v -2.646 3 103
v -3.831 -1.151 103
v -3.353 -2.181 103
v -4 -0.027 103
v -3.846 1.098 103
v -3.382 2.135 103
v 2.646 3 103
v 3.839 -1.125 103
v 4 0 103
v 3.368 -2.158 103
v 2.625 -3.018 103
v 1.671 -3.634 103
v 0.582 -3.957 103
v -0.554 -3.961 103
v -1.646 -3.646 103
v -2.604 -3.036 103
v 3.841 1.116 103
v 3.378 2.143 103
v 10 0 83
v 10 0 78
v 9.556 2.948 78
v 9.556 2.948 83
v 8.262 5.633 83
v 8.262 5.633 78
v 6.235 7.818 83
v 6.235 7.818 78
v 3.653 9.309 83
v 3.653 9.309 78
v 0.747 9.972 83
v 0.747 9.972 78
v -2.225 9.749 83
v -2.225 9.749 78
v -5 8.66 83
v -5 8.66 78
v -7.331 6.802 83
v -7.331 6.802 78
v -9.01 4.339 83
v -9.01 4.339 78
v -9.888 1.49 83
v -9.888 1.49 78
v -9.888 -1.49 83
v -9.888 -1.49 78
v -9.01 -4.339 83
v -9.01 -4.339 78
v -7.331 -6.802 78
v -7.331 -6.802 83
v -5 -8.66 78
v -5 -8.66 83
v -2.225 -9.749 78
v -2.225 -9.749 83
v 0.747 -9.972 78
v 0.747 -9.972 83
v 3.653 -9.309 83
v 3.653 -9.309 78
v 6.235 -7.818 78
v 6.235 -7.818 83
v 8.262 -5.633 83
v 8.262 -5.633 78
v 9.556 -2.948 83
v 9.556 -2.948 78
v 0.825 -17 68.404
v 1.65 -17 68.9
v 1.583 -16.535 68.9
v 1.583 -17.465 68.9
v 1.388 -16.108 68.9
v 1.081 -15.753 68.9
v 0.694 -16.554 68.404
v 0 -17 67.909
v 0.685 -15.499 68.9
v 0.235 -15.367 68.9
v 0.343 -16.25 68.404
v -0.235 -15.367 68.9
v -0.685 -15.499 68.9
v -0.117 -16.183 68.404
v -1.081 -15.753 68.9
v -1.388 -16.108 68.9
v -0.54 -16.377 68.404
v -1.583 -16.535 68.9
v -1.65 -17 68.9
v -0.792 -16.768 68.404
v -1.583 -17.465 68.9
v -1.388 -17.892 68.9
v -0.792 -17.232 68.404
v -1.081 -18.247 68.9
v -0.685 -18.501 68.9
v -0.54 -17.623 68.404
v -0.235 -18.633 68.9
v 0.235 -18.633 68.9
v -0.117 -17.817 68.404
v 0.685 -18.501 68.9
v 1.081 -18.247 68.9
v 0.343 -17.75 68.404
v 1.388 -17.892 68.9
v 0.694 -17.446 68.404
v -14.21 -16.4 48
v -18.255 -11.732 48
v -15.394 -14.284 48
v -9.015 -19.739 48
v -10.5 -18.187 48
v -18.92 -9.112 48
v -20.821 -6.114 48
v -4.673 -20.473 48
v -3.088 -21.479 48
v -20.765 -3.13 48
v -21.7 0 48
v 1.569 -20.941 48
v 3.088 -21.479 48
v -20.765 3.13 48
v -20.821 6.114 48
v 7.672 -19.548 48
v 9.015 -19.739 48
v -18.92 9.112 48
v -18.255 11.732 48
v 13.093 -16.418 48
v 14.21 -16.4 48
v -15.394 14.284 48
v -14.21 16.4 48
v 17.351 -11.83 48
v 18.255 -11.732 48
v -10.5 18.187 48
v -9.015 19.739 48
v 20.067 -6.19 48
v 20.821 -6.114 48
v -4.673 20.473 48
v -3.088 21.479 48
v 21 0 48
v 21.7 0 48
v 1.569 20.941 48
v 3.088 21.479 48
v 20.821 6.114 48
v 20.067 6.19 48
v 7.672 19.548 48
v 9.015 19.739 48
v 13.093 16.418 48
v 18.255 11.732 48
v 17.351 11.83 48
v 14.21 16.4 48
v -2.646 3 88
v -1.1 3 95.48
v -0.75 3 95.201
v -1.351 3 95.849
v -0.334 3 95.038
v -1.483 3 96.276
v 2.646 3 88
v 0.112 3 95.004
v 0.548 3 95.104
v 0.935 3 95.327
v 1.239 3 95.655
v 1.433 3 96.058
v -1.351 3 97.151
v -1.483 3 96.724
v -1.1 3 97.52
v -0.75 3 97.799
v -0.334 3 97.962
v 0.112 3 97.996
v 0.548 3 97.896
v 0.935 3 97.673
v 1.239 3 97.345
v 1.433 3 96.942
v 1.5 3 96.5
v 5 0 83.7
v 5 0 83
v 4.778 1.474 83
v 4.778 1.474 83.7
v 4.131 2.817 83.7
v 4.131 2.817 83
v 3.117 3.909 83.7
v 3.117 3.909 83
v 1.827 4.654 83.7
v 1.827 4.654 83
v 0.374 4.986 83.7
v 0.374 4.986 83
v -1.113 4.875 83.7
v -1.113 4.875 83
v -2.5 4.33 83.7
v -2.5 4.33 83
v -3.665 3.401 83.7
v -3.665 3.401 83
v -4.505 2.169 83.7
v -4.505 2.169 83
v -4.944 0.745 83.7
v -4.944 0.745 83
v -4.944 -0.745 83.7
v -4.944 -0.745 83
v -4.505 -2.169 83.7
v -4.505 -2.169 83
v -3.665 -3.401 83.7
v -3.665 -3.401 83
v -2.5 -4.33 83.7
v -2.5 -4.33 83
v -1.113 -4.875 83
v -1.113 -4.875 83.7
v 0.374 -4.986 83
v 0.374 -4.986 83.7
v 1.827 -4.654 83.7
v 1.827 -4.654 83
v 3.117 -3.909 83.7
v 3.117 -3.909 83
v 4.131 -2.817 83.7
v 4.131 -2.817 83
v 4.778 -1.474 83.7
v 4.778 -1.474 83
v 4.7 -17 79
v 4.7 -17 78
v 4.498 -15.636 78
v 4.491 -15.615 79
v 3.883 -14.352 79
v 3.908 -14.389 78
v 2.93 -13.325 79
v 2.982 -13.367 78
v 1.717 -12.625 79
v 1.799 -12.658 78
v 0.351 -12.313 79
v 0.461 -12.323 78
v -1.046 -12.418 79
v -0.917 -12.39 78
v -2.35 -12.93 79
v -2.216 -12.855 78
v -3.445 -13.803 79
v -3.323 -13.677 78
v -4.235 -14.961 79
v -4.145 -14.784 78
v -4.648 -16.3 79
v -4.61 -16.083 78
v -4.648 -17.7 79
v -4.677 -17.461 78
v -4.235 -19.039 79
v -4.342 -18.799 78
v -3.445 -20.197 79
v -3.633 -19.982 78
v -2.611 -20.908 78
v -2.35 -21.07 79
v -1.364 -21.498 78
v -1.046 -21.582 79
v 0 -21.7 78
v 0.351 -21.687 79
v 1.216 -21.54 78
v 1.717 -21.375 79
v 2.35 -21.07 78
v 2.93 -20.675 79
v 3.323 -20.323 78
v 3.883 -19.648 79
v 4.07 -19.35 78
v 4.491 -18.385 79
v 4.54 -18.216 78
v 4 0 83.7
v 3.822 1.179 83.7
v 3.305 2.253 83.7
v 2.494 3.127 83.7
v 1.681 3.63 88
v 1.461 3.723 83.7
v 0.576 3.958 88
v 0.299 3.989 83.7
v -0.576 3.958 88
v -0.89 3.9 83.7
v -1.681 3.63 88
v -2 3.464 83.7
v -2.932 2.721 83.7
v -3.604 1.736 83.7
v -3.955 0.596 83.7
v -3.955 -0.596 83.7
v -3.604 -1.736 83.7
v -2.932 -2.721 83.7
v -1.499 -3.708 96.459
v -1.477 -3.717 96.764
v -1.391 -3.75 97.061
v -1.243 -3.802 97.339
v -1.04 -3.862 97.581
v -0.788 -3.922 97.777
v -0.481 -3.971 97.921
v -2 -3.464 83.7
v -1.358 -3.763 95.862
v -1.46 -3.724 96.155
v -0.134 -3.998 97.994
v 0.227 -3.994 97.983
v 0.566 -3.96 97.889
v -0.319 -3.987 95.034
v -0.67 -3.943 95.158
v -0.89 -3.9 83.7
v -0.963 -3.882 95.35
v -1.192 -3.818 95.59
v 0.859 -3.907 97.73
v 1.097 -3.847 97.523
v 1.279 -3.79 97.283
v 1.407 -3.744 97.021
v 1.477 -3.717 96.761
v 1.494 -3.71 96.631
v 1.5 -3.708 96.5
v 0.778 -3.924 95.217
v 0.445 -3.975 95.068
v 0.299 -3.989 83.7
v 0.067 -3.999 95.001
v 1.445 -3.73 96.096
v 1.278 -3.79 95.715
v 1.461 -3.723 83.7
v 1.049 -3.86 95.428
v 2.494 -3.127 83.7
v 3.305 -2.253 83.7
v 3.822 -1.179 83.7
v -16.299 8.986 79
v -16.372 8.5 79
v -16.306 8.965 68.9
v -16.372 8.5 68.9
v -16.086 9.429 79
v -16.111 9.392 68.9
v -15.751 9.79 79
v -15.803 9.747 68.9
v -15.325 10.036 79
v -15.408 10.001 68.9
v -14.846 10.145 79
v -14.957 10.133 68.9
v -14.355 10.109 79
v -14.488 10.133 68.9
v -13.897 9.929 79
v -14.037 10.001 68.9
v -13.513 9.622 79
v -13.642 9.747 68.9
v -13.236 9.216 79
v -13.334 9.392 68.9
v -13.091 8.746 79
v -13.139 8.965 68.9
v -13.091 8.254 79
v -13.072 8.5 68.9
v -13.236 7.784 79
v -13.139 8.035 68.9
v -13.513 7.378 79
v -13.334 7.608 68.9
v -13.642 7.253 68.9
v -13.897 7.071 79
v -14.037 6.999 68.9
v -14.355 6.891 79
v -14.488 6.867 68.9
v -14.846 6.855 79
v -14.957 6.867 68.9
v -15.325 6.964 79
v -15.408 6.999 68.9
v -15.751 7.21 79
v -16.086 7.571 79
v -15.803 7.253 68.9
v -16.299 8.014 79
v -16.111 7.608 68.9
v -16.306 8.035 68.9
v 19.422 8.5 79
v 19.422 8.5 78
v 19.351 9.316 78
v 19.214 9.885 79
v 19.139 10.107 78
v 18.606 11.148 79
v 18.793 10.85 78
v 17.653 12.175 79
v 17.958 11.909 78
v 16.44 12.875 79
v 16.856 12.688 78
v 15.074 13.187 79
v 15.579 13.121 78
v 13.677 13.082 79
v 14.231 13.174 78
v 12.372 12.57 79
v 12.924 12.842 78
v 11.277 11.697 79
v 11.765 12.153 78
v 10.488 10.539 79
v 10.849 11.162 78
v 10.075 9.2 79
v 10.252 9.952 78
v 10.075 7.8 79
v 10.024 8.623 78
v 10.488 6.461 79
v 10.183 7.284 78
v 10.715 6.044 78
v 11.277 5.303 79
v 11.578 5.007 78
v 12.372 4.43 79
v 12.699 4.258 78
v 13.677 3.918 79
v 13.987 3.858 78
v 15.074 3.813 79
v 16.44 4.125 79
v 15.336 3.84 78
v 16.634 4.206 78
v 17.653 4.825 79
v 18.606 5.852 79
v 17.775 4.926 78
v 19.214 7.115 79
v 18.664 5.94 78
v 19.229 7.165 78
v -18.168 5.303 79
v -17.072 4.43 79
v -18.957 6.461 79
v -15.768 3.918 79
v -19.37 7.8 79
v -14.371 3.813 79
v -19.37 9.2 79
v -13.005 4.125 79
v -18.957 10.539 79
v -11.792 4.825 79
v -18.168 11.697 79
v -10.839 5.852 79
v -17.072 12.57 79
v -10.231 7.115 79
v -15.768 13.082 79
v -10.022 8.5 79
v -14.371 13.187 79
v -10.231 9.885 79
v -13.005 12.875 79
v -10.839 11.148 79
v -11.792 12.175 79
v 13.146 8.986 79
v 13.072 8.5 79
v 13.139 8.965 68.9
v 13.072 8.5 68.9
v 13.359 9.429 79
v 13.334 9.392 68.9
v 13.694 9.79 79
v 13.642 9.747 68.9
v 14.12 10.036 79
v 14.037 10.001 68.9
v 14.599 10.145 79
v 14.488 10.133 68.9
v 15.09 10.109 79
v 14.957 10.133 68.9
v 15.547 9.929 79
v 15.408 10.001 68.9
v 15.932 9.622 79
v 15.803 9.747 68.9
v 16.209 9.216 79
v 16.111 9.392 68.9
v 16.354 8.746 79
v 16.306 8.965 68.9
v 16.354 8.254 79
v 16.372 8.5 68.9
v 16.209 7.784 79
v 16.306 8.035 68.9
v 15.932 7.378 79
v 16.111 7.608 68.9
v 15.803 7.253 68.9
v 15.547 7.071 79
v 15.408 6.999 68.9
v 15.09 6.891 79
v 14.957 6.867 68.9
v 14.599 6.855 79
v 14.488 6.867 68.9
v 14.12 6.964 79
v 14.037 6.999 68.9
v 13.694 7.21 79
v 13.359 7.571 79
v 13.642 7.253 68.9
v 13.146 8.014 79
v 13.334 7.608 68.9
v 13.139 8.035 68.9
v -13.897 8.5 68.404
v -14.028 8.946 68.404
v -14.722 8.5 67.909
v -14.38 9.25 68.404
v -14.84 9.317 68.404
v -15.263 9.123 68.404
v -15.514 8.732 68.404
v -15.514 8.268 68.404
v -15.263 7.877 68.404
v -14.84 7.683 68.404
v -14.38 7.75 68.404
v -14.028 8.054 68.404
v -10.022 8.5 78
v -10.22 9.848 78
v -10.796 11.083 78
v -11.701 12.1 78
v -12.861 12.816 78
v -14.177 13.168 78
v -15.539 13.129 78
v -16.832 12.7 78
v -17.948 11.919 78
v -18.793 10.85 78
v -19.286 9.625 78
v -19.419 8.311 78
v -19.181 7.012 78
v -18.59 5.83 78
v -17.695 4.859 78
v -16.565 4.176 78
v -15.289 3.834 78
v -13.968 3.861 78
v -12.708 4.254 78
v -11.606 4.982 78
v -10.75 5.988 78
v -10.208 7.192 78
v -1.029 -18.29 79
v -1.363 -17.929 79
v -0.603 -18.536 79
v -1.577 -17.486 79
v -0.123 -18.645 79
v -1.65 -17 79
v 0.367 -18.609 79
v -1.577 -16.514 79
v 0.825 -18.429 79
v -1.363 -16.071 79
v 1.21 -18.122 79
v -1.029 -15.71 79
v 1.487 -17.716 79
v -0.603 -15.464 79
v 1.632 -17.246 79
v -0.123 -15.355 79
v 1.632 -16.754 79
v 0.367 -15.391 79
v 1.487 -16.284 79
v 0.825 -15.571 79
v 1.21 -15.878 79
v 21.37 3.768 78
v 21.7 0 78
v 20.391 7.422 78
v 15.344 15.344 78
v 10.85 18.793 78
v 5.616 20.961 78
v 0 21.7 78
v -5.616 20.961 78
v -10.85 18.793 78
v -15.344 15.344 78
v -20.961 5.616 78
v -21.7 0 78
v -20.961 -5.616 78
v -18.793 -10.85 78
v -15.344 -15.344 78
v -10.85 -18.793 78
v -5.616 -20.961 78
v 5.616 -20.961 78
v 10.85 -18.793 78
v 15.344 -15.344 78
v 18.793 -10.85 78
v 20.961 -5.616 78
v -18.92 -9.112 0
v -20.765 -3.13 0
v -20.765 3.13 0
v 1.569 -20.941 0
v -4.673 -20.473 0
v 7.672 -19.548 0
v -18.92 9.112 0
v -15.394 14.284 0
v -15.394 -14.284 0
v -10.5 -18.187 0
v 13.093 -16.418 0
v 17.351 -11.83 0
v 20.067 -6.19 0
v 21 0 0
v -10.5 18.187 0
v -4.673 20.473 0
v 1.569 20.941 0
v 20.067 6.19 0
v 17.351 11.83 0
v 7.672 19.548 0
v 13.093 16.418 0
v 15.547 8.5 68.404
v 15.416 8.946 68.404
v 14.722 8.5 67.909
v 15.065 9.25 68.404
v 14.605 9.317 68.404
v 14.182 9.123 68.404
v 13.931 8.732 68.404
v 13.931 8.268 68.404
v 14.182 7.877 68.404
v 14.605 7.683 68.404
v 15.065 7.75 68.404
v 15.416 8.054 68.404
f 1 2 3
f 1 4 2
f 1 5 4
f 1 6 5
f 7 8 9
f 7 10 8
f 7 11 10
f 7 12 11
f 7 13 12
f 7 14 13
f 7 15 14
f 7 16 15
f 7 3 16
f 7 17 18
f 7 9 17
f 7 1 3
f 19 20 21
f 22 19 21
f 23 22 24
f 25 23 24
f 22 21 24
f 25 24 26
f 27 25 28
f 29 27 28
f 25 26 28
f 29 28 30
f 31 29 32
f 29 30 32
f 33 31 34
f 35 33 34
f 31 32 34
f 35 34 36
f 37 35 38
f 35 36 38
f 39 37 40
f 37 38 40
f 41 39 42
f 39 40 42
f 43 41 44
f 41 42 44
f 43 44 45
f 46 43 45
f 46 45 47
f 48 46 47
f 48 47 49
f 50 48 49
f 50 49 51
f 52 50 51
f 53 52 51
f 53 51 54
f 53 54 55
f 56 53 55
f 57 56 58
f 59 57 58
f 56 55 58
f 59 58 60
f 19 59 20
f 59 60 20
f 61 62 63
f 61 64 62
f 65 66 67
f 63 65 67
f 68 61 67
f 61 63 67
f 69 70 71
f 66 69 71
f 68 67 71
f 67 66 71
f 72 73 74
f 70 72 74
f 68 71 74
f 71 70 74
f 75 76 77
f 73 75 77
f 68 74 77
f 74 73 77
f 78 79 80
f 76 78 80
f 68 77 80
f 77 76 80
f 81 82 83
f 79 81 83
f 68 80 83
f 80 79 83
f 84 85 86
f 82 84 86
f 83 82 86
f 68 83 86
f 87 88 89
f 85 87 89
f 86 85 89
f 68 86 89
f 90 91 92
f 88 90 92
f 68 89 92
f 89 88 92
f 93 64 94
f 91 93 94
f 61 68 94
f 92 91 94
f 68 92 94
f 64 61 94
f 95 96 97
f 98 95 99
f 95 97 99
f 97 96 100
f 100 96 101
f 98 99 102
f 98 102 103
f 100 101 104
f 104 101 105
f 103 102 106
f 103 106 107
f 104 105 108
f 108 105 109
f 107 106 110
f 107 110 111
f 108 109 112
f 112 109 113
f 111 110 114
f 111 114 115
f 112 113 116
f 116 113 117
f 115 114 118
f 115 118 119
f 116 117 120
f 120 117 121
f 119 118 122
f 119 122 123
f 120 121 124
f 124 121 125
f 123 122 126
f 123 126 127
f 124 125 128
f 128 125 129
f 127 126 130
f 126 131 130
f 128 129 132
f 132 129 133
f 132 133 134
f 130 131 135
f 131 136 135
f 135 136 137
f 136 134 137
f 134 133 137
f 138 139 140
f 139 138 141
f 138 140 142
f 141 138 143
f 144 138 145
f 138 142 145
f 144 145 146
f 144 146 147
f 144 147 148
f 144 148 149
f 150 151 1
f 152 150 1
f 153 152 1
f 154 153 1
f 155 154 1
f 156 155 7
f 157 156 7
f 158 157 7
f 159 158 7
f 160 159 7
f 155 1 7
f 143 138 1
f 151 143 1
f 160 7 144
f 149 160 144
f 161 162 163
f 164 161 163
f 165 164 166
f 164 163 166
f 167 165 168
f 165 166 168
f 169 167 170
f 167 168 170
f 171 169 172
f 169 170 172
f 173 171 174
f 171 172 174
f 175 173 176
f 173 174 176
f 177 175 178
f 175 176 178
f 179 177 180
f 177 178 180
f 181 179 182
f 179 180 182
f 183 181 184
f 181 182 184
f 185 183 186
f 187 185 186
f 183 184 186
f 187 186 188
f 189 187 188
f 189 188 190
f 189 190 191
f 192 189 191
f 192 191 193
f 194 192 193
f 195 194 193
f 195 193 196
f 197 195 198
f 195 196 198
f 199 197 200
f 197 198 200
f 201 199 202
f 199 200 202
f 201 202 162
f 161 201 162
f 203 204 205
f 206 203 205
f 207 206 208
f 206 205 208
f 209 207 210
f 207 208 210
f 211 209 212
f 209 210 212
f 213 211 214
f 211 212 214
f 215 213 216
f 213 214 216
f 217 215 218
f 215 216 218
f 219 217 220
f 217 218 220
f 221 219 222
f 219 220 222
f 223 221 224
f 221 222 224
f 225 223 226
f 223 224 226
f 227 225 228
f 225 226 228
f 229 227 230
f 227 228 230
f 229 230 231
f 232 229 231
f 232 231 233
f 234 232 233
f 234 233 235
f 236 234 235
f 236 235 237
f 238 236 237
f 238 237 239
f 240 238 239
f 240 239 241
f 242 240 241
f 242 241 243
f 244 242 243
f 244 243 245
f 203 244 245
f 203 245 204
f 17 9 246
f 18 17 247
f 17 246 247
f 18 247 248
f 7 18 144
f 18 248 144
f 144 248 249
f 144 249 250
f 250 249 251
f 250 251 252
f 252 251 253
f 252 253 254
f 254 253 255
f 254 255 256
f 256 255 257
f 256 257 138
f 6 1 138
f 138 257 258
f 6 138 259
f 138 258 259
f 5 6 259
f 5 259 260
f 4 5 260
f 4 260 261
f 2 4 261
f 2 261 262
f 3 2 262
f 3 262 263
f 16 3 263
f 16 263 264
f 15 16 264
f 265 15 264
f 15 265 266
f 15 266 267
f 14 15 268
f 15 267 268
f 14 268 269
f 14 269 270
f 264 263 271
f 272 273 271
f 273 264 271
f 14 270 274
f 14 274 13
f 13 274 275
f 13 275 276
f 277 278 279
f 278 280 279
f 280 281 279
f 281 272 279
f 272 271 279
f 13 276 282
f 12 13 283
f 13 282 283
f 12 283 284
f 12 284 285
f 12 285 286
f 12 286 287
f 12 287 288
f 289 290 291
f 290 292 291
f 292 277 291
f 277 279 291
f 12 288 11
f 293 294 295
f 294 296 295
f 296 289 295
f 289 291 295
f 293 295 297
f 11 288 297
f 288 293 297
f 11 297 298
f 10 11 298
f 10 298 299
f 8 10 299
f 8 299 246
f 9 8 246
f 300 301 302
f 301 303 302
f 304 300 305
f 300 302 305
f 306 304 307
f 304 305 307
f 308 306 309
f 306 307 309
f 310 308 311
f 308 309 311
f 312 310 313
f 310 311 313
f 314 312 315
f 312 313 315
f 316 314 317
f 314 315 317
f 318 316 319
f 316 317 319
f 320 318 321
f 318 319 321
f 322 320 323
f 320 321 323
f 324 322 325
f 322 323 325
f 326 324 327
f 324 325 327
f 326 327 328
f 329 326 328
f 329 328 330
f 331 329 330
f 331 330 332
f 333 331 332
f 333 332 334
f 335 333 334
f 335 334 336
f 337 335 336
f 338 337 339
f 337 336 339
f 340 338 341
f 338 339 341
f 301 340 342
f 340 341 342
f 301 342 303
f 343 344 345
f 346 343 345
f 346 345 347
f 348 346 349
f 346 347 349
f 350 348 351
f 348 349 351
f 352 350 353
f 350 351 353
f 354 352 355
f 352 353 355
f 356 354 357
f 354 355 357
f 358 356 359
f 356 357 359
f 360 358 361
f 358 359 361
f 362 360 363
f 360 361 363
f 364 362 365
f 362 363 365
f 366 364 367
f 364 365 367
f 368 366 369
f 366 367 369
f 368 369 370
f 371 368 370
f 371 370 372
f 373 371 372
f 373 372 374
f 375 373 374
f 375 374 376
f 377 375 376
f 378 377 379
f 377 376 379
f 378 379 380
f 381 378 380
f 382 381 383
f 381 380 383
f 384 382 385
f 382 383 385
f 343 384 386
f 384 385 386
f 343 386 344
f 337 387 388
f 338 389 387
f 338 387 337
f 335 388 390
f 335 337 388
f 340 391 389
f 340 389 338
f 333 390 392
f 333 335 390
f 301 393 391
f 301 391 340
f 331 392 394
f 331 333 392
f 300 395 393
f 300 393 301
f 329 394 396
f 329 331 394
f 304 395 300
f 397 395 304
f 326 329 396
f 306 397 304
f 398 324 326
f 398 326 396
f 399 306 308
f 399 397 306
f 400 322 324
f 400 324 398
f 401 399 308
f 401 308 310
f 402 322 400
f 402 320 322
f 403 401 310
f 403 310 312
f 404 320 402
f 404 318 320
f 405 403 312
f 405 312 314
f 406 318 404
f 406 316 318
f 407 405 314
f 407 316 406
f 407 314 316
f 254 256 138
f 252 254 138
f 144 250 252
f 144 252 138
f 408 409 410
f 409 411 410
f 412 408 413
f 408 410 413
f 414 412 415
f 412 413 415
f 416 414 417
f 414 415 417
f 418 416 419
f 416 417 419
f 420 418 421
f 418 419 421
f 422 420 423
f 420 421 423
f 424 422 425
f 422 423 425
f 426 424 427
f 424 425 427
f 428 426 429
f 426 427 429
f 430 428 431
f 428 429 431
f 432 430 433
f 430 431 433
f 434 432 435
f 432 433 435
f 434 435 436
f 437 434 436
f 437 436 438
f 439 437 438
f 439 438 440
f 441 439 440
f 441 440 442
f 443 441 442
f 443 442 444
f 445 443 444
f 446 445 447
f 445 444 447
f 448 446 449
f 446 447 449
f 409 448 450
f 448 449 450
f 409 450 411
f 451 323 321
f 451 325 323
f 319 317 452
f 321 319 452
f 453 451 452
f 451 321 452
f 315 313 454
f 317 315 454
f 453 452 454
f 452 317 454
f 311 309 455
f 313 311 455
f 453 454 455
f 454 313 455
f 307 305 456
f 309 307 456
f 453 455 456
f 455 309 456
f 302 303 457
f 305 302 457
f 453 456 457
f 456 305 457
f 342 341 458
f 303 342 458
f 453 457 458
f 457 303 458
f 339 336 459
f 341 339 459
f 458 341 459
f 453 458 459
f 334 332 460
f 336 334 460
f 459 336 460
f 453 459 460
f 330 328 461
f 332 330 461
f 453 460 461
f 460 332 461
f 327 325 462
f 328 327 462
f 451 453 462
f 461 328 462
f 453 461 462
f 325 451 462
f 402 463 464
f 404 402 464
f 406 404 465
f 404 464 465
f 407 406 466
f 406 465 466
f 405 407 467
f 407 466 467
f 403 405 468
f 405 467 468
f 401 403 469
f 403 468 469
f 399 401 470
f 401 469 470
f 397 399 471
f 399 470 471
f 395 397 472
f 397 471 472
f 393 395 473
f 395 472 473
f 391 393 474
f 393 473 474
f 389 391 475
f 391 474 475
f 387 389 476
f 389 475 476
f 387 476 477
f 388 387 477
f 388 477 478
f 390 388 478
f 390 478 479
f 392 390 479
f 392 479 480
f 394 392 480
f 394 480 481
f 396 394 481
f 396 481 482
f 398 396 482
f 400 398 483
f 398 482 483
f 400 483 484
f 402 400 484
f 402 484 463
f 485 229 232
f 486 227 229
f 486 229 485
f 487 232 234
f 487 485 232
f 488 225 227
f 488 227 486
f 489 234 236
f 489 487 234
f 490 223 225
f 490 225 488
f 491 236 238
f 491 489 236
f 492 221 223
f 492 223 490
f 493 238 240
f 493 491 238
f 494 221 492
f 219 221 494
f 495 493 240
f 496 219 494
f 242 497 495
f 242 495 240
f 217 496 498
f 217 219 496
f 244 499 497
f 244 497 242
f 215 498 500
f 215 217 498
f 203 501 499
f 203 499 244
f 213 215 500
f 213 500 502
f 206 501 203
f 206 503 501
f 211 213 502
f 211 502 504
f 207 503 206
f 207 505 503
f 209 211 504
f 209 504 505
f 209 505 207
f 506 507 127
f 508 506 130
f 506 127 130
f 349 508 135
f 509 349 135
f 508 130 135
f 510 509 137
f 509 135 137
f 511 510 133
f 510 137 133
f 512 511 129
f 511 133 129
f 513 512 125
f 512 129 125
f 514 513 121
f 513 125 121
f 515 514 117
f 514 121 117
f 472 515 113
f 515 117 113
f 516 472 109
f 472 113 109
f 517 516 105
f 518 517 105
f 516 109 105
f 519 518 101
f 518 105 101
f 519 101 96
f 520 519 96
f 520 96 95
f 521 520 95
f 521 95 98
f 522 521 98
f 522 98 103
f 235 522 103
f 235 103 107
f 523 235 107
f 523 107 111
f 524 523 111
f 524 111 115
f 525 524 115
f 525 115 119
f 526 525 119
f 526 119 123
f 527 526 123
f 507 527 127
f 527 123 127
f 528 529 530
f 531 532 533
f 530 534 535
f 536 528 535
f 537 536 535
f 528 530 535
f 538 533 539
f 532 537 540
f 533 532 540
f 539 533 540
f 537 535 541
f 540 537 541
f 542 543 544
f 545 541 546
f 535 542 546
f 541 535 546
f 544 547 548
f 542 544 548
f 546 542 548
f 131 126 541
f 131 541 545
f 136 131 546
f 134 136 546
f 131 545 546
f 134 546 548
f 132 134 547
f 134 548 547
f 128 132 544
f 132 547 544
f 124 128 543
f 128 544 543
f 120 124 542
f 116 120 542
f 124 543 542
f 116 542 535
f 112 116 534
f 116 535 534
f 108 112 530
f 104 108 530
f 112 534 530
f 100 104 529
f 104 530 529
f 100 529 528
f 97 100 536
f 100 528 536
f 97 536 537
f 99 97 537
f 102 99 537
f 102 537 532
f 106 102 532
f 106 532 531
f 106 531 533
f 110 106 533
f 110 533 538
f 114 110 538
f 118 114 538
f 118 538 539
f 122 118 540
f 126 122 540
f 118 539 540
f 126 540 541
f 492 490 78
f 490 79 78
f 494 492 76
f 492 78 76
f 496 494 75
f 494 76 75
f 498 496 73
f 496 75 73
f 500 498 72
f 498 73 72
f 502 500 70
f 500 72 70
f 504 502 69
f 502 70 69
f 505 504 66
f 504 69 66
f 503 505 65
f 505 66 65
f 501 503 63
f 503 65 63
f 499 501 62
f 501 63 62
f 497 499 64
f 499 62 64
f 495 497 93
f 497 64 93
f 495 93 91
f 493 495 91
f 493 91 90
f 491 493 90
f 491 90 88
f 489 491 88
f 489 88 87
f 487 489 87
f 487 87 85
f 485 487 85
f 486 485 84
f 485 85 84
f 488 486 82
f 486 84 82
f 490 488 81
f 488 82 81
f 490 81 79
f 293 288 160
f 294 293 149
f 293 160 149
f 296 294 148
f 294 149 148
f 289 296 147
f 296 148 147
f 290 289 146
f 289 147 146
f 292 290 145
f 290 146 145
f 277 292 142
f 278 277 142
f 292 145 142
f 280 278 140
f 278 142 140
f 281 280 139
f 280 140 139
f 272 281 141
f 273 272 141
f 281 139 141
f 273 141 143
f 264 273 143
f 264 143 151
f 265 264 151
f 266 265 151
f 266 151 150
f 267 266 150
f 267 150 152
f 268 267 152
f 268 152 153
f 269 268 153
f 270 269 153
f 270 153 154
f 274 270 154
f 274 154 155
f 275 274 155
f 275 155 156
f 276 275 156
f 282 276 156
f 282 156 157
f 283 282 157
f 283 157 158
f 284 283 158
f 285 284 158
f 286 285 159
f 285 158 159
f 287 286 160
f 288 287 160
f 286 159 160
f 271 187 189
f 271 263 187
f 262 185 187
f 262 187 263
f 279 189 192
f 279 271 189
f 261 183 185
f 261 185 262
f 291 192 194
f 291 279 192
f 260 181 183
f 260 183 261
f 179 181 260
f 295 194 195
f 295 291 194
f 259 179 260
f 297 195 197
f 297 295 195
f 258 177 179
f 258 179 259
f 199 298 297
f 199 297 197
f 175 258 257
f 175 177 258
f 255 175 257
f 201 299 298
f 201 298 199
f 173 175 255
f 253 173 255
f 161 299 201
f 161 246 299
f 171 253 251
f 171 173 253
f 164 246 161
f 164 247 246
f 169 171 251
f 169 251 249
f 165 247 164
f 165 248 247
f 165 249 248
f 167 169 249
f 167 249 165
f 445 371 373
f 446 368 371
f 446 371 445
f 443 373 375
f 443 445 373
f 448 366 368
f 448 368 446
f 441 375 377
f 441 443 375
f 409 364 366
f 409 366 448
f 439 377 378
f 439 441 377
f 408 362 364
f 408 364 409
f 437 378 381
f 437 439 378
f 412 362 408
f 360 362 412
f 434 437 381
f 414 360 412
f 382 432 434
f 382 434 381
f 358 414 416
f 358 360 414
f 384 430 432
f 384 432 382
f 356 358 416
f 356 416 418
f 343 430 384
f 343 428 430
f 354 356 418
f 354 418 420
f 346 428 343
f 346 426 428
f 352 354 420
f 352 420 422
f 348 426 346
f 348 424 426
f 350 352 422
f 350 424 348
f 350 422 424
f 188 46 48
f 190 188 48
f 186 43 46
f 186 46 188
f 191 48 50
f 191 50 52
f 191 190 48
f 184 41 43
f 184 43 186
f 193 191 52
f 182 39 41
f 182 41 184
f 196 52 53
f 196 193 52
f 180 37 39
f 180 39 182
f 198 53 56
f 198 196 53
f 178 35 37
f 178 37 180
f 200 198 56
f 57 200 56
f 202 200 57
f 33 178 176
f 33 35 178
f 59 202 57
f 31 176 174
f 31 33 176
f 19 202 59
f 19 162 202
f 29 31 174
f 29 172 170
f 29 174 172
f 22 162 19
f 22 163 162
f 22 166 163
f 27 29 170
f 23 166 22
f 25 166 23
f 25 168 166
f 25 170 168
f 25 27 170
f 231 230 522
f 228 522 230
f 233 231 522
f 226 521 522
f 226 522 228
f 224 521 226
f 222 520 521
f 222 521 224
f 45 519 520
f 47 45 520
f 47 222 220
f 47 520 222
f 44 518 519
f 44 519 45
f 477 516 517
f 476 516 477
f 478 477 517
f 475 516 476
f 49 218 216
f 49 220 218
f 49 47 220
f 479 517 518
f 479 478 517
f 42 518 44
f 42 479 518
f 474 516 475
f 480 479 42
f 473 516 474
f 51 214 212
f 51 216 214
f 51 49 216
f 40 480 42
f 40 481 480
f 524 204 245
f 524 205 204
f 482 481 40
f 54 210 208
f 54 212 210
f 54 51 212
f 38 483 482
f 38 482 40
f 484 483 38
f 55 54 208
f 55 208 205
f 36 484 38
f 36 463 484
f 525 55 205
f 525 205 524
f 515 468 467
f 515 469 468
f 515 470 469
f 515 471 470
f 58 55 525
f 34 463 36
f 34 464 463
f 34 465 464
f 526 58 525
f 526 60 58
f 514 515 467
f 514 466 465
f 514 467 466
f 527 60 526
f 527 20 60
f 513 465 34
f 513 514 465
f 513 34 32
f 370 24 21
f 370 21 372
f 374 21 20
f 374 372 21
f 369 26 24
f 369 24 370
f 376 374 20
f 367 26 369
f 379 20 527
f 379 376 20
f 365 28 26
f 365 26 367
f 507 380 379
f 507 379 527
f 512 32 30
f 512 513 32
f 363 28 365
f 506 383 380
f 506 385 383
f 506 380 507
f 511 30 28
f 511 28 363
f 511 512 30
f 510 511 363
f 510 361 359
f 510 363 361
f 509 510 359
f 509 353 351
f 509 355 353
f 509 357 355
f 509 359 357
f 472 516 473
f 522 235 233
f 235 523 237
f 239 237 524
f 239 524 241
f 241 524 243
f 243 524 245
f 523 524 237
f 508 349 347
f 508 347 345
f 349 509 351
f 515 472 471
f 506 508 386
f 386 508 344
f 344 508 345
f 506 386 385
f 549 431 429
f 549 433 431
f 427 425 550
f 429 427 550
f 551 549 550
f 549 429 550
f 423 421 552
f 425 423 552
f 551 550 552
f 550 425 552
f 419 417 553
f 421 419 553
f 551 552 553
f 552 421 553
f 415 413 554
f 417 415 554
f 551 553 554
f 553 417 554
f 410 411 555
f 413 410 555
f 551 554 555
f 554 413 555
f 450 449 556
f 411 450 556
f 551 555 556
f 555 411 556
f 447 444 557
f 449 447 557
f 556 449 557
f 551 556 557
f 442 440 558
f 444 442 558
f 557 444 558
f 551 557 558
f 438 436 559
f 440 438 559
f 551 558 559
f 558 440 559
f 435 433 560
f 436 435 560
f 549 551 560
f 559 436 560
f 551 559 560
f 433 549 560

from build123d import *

# Parameters (mm, degrees)
SKETCH1_R                 = 21
BOSS_EXTRUDE1_DEPTH       = 48
SKETCH2_R                 = 21.7
BOSS_EXTRUDE2_DEPTH       = 30
SKETCH3_R                 = 4.7
BOSS_EXTRUDE3_DEPTH       = 1
SKETCH3_3_R               = 10
BOSS_EXTRUDE4_DEPTH       = 5
SKETCH4_R                 = 4
BOSS_EXTRUDE5_DEPTH       = 20
CUT_EXTRUDE1_DEPTH        = 1
CUT_EXTRUDE1_DEPTH_BACK   = 15
SKETCH6_R                 = 1.5
CUT_EXTRUDE2_DEPTH        = 15
M4X0_7_TAPPED_HOLE2_D     = 3.3
M4X0_7_TAPPED_HOLE2_DEPTH = 10.1
M4X0_7_TAPPED_HOLE2_TIP   = 0.991420021
SKETCH9_R                 = 5
SKETCH9_R_2               = 4
BOSS_EXTRUDE6_DEPTH       = 0.7


with BuildPart() as part:
    # Sketch1 → Boss-Extrude1 (new body)
    with BuildSketch(Plane.XY):
        Circle(SKETCH1_R)
    extrude(amount=BOSS_EXTRUDE1_DEPTH)

    # Sketch2 → Boss-Extrude2 (add)
    with BuildSketch(Plane.XY.offset(48)):
        Circle(SKETCH2_R)
    extrude(amount=BOSS_EXTRUDE2_DEPTH)

    # Sketch3 → Boss-Extrude3 (add)
    with BuildSketch(Plane.XY.offset(78)):
        with Locations((-14.722431864, 8.5)):
            Circle(SKETCH3_R)
        with Locations((14.722431864, 8.5)):
            Circle(SKETCH3_R)
        with Locations((0, -17)):
            Circle(SKETCH3_R)
    extrude(amount=BOSS_EXTRUDE3_DEPTH)

    # Sketch3<3> → Boss-Extrude4 (add)
    with BuildSketch(Plane.XY.offset(78)):
        Circle(SKETCH3_3_R)
    extrude(amount=BOSS_EXTRUDE4_DEPTH)

    # Sketch4 → Boss-Extrude5 (add)
    with BuildSketch(Plane.XY.offset(83)):
        Circle(SKETCH4_R)
    extrude(amount=BOSS_EXTRUDE5_DEPTH)

    # Sketch5 → Cut-Extrude1 (cut, two sides)
    with BuildSketch(Plane.XY.offset(103)) as cut_extrude1_sk:
        Polygon((-82.008727225, 3), (-2.645751311, 3), (2.645751311, 3), (82.008727225, 3), (82.008727225, 161.725951827), (-82.008727225, 161.725951827), align=None)
    extrude(amount=CUT_EXTRUDE1_DEPTH, mode=Mode.SUBTRACT)
    extrude(cut_extrude1_sk.sketch, amount=-CUT_EXTRUDE1_DEPTH_BACK, mode=Mode.SUBTRACT)

    # Sketch6 → Cut-Extrude2 (cut)
    with BuildSketch(Plane(origin=(0, 3, 0), x_dir=(1, 0, 0), z_dir=(0, 1, 0))):
        with Locations((0, -96.5)):
            Circle(SKETCH6_R)
    extrude(amount=-CUT_EXTRUDE2_DEPTH, mode=Mode.SUBTRACT)

    # M4x0.7 Tapped Hole2
    with Locations(Plane(origin=(0, -17, 79), x_dir=(1, 0, 0), z_dir=(0, 0, 1))):
        with Locations((0, 0), (14.722431864, 25.5), (-14.722431864, 25.5)):
            Hole(M4X0_7_TAPPED_HOLE2_D / 2, depth=M4X0_7_TAPPED_HOLE2_DEPTH)
            with Locations((0, 0, -(M4X0_7_TAPPED_HOLE2_DEPTH + M4X0_7_TAPPED_HOLE2_TIP / 2))):  # 118° drill point
                Cone(0, M4X0_7_TAPPED_HOLE2_D / 2, M4X0_7_TAPPED_HOLE2_TIP, mode=Mode.SUBTRACT)

    # Sketch9 → Boss-Extrude6 (add)
    with BuildSketch(Plane.XY.offset(83)):
        Circle(SKETCH9_R)
        Circle(SKETCH9_R_2, mode=Mode.SUBTRACT)
    extrude(amount=BOSS_EXTRUDE6_DEPTH)


solid = part.part
